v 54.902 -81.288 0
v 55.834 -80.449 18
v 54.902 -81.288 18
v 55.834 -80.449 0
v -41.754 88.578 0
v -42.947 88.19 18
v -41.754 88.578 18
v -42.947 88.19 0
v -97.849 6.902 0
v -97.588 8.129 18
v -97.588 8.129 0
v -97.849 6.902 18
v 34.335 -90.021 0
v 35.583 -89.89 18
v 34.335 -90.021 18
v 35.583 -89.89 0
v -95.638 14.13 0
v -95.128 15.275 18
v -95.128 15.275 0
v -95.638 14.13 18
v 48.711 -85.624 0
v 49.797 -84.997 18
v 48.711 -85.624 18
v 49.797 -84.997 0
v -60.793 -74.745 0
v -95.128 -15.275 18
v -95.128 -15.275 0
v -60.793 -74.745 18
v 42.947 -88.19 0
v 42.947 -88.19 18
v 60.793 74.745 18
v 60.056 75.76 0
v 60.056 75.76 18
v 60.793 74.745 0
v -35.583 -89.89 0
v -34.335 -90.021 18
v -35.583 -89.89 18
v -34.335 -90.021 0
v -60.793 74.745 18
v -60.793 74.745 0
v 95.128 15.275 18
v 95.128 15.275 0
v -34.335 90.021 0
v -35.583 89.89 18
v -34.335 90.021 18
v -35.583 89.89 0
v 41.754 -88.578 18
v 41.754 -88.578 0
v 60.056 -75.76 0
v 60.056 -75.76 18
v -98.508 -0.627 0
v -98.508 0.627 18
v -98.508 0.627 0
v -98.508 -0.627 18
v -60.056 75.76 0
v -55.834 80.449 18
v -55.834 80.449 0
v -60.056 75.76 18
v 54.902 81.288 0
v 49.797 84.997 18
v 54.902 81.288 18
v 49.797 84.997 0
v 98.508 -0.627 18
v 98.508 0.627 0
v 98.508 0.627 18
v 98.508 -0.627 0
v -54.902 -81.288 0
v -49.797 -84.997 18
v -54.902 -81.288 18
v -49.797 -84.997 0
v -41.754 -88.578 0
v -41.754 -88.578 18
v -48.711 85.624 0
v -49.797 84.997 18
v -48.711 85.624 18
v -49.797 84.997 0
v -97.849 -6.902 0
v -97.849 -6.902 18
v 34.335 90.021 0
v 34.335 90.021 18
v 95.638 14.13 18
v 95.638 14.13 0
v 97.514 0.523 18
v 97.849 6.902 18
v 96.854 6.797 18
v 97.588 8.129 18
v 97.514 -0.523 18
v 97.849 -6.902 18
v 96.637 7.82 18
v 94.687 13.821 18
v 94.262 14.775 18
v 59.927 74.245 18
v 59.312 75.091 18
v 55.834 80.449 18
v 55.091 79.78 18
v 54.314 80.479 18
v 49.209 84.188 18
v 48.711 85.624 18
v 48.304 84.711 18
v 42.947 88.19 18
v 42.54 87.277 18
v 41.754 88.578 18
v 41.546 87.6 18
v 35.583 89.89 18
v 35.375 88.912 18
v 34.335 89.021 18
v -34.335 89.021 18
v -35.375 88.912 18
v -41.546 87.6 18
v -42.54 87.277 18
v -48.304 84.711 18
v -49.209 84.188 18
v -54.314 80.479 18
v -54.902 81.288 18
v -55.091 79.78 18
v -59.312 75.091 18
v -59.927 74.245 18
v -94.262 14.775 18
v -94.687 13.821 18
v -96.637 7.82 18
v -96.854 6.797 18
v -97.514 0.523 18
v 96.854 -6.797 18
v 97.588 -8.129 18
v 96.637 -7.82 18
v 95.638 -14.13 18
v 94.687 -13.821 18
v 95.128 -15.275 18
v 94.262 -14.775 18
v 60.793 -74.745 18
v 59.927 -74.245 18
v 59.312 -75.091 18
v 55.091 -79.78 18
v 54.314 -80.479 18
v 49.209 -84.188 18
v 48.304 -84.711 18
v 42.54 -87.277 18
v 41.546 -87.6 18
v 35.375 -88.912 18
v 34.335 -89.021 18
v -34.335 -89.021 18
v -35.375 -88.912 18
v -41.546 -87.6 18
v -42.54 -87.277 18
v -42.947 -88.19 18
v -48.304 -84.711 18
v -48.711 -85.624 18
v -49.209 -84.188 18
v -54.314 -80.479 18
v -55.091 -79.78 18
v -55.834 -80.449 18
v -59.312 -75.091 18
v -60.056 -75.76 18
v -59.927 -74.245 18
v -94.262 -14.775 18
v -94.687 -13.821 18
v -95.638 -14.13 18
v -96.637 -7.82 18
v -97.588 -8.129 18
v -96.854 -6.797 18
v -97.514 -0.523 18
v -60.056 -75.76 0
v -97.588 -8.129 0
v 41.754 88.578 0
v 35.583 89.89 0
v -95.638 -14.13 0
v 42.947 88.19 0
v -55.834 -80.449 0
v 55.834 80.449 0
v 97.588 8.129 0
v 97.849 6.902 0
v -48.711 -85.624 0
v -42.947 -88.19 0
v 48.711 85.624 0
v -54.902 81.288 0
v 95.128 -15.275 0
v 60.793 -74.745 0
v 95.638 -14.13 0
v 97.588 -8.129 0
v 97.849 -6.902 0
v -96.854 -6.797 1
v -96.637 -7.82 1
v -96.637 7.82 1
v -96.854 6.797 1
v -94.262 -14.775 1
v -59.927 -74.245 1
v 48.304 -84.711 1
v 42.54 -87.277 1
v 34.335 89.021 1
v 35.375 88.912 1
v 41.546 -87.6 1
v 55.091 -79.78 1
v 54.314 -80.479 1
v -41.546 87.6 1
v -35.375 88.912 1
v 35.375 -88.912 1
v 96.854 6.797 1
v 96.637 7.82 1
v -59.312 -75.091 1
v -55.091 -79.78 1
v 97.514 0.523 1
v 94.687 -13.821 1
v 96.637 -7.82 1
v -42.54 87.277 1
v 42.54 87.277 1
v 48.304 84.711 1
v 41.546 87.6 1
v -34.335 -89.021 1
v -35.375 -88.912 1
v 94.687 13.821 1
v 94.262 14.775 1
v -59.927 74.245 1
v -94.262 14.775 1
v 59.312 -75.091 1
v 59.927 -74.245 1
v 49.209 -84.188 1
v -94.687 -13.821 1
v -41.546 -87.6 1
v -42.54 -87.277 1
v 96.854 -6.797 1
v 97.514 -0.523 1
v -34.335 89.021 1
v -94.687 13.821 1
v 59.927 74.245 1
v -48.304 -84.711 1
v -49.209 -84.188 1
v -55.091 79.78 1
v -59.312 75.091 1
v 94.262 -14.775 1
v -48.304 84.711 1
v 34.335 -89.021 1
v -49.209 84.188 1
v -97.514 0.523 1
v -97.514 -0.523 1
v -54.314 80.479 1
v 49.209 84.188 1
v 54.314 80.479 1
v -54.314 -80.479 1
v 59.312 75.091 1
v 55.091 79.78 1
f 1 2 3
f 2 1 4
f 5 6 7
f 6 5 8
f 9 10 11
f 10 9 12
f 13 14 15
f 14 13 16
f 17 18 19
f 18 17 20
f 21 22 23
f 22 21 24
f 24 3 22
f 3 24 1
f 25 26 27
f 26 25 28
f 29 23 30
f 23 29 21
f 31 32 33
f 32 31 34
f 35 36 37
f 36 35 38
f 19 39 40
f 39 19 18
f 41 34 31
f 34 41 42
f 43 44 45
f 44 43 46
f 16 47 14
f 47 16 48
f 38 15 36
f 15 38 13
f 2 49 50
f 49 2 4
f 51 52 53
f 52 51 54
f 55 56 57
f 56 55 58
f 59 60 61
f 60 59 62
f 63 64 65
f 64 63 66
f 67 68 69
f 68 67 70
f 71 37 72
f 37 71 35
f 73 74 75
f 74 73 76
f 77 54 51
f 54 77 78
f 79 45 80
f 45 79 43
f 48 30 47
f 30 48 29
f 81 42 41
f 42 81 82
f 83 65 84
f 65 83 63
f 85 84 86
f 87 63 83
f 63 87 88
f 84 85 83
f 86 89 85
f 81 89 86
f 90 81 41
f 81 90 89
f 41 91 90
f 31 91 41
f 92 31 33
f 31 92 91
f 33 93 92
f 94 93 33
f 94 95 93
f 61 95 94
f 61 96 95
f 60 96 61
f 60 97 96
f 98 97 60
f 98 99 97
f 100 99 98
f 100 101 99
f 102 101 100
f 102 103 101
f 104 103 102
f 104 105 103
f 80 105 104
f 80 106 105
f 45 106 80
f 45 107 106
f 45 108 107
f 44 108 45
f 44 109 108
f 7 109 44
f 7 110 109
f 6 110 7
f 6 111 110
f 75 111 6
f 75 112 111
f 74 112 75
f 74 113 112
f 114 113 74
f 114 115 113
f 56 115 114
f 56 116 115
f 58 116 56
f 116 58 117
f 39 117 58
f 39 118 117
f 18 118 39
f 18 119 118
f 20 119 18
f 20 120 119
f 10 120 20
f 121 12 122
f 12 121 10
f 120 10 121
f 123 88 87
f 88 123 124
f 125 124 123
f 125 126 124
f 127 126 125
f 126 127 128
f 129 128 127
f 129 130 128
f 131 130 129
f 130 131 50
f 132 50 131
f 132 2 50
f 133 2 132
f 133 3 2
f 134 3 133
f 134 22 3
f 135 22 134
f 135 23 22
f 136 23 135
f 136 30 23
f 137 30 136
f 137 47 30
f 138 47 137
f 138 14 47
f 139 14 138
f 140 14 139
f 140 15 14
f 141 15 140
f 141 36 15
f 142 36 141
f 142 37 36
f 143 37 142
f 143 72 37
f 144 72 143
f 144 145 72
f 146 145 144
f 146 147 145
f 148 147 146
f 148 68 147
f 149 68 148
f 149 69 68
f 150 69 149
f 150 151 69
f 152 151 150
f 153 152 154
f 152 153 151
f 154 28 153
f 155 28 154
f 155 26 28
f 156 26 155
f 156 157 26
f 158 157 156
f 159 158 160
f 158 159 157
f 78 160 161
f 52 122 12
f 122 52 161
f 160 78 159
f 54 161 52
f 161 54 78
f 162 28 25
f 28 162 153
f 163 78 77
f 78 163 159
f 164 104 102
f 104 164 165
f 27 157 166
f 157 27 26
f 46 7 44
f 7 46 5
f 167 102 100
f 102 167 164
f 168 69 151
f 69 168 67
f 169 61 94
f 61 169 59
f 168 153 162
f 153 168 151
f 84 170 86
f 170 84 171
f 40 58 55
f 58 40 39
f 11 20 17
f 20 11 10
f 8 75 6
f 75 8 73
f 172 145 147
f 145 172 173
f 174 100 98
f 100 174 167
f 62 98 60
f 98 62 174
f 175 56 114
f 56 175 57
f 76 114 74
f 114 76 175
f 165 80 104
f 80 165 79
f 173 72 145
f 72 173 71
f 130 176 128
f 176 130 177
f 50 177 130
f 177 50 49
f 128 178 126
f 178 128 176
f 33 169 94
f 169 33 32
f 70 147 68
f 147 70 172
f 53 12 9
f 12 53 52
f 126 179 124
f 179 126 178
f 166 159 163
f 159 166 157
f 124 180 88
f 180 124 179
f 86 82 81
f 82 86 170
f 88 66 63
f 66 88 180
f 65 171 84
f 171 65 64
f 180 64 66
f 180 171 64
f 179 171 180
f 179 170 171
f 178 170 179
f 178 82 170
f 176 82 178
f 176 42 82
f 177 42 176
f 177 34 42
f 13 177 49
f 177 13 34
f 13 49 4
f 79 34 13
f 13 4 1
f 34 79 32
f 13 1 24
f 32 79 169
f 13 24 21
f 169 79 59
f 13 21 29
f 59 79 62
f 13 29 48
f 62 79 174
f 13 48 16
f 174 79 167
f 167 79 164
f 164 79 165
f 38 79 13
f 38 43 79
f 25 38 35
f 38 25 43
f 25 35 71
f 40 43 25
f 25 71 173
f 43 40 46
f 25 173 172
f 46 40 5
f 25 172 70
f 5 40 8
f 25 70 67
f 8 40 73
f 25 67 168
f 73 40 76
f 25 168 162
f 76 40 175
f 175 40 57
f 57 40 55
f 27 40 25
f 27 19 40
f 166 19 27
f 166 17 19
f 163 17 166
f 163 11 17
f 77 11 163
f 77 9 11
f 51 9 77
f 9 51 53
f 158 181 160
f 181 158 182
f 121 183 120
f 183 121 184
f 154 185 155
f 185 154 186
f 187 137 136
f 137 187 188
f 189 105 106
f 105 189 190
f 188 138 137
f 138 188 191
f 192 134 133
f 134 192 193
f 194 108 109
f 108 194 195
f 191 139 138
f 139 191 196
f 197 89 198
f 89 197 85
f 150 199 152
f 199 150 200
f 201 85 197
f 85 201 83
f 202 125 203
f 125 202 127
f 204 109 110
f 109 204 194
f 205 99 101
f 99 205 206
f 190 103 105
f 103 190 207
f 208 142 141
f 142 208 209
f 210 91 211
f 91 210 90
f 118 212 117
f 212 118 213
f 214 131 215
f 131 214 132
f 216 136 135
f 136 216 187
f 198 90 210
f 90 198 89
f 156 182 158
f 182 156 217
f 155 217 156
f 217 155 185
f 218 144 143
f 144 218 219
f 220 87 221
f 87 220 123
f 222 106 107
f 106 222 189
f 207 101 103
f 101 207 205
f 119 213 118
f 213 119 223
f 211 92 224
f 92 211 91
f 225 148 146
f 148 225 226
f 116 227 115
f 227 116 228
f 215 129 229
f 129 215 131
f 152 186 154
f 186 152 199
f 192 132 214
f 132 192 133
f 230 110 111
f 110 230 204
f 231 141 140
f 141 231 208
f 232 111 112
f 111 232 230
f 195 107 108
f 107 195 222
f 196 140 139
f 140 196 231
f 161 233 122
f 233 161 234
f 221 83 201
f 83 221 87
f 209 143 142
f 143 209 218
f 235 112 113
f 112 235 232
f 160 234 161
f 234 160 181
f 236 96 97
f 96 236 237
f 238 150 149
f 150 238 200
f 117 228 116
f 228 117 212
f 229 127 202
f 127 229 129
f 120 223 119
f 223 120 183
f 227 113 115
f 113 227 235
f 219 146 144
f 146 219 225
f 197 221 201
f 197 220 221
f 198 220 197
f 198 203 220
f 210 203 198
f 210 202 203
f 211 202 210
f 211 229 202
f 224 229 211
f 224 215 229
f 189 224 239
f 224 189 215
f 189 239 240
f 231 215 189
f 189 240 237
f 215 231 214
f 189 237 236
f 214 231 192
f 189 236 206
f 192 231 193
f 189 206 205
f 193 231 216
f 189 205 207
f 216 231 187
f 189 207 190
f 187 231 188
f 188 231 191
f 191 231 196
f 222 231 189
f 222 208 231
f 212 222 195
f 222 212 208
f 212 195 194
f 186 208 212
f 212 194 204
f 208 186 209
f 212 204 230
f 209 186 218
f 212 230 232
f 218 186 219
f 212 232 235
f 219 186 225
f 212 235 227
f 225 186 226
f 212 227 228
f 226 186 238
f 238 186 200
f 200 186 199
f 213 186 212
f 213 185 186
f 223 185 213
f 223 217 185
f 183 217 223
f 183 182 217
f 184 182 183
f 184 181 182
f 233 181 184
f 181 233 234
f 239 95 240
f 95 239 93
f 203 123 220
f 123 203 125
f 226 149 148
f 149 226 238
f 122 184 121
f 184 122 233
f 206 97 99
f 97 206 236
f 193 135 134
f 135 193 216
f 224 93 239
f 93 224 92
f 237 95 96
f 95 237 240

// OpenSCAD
// A twelve-sided letter die: a regular dodecahedron, sphere-clipped so each pentagon face becomes a flat circle
// (the sphere's own radius is picked so that circle reaches exactly to the pentagon's edge midpoints -- see the
// sphere/dodecahedron discussion this came out of), with one letter engraved into each face.
//
// letterSets holds 7 dice's worth of letters for a Spelling-Bee-style word game (words need only contain
// whichever die is playing the centre role -- unlike Boggle, adjacency on the die doesn't matter) -- picked for a
// reasonable vowel/consonant mix on every die, Scrabble-ish in frequency, "Qu" standing in for Q the way Boggle's
// own cubes do. Change `set` below to carve a different one.
letterSets = [
	["A", "E", "I", "K", "O", "C", "D", "H", "N", "P", "S", "T"],
	["A", "E", "I", "H", "M", "N", "R", "S", "T", "D", "V", "Y"],
	["E", "F", "H", "M", "N", "O", "R", "S", "U", "D", "Y", "B"],
	["A", "B", "E", "F", "I", "J", "L", "M", "O", "R", "S", "U"],
	["A", "B", "E", "G", "I", "L", "O", "R", "S", "T", "U", "Z"],
	["A", "C", "E", "G", "L", "N", "O", "Qu", "R", "T", "U", "W"],
	["A", "C", "D", "E", "G", "I", "L", "N", "O", "P", "T", "W"],
];
set = -2;

edge = 20;						// edge length
inradius = edge / 2 * sqrt(5 / 2 + 11 / (2 * sqrt(5)));	// centre to a face
apothem  = edge / (2 * tan(180 / 5));						// centre to that face's own edge midpoint
tilt = atan(2);					// 63.435 degrees between adjacent face normals
die_r = sqrt(inradius * inradius + apothem * apothem);	// the die's own radius -- reaches to each face's edge midpoints

module slab(x, y, z)
	cube([x, y, z], center = true);

module dodecahedron() {
	x = 4 * edge;
	z = 2 * inradius;
	// a plain `for` here would union its five iterations before intersecting -- barely constraining anything, since
	// intersecting with the *union* of the five tilted slabs excludes almost nothing a single one didn't already.
	// intersection_for() is the dedicated construct for intersecting each iteration in turn (see childrenOf's own
	// comment in evaluate.ts for why plain `for` cannot do this).
	intersection() {
		slab(x, x, z);
		intersection_for (i = [0 : 4])
			rotate([tilt, 0, i * 72])   slab(x, x, z);
	}
}

// the die itself: a sphere clipped by the dodecahedron, so every face is exactly the pentagon's own inscribed circle
module die()
	intersection() {
		sphere(r = die_r);
		dodecahedron();
	}

// one letter, cut down through its face's own plane -- starting inside the die and ending outside it, so the
// difference is a clean engraving regardless of the sphere's curvature there
module letter(ch)
	translate([0, 0, inradius - 1])
		linear_extrude(height = 3)
			text(ch, size = apothem, halign = "center", valign = "center", font = "Liberation Sans:style=Bold");

// one labelled die: the twelve faces, in the same order dodecahedron() builds them -- the "north" and "south"
// poles (the one untilted slab, and its opposite), then five around each pole, tilted and spun 72 degrees apart
module labelled_die(letters) {
	difference() {
		die();
		union() {
			letter(letters[0]);
			for (i = [0 : 4])
				rotate([tilt, 0, i * 72])   letter(letters[i + 1]);
			rotate([180, 0, 0]) {
				letter(letters[6]);
				for (i = [0 : 4])
					rotate([tilt, 0, i * 72])   letter(letters[i + 7]);
			}
		}
	}
}

// --- tray + lid: seven cylindrical cells (one per die, plain flat floors, walls between and around them, the
// same shape the real Boggle tray in the reference photo uses) laid out with a centre cell and six around it, to
// match the Spelling-Bee-style "must use the centre letter" rule -- with a lid that seals over the top and gives
// a die room to tumble while the whole thing is shaken, since the cell walls alone are shorter than a die and are
// only there to keep settled dice apart, not to contain a shake by themselves.
tray_clearance = 4;			// radial room around a die in its own cell
tray_wall      = 2;			// material between neighbouring cells, and around the outside
cell_r         = die_r + tray_clearance;
tray_spacing   = 2 * cell_r + tray_wall;
tray_floor     = 3;
tray_wall_h    = 15;			// the tray's own walls: shorter than a die, just enough to separate settled dice
tray_h         = tray_floor + tray_wall_h;

// one centre die, six in a ring around it
tray_centres = [[0, 0], for (a = [0 : 60 : 300]) [tray_spacing * cos(a), tray_spacing * sin(a)]];

module tray_holes(r)
	for (c = tray_centres)
		translate(c) circle(r = r);

module tray_area(r, off)
	offset(r = off) hull() tray_holes(r);

module tray() {
/*	color([1,1,1], $metallic=1) union() {
	difference() {
		linear_extrude(tray_h) tray_area(cell_r, tray_wall * 2);
		translate([0, 0, tray_floor])
			linear_extrude(tray_wall_h + 1)
				tray_holes(cell_r);
	}

	difference() {
		linear_extrude(tray_h) tray_area(cell_r, tray_wall * 2 + 3);
		translate([0,0,4]) linear_extrude(tray_h) tray_area(cell_r, tray_wall * 2 + 1.5);
	}
	}
*/	difference() {
		linear_extrude(tray_h) tray_area(cell_r, tray_wall * 3);
		translate([0,0,1]) linear_extrude(tray_h) tray_area(cell_r, tray_wall * 3 - 1);
	}
}

module lid() {
	color([0,1,0]) tray();
	fit     = 0.4;								// total clearance so the lid slips over the tray's wall rather than jamming
	cavity  = 2 * die_r + 30;	// together with the tray's own wall height, enough for a die to tumble

	//minkowski() {
	//	linear_extrude(1) tray_area(cell_r, tray_wall + fit + 1 - 20);
	//	sphere(r = 20);
	//}

//	color(function(x, y, z) [x, y, z] / 100)
	color([0.5,0.5,0.5,0])
	translate([0,0,14])
	rotate([0,0,0]) {
	difference() {
		minkowski() {linear_extrude(cavity) tray_area(cell_r, tray_wall + 2 - 20); sphere(r = 20);}
		translate([0, 0, -50]) cube([200,200,100], center=true);
		translate([0, 0, -2])
			minkowski() {linear_extrude(cavity) tray_area(cell_r, tray_wall - 20 - 1.5); sphere(r = 20);}
		translate([0, 0, 10-cavity])
			linear_extrude(cavity) tray_area(cell_r, tray_wall +.5);
		translate([0, 0, cavity + 20 - 1])
			linear_extrude(1)
				text("Beegle", size = 40, halign = "center", valign = "center", font = "Liberation Sans:style=Bold");
	}
	}

}

if (set >= 0) {
	labelled_die(letterSets[set]);

} else if (set == -1) {
	spacing = 2 * die_r * 1.15;	// a die's own diameter, plus a gap
	for (i = [0 : len(letterSets) - 1])
		translate([(i - (len(letterSets) - 1) / 2) * spacing, 0, 0])
			labelled_die(letterSets[i]);

} else if (set == -2) {			// the tray, with a die (unlabelled) resting in each cell
	tray();
	//for (c = tray_centres)
	//	translate([c[0], c[1], tray_floor + die_r])
	//		die();

} else if (set == -3) {			// the lid on its own
	lid();

} else if (set == -4) {			// tray and lid stacked, as they sit when closed
	tray();
	translate([0, 0, tray_h])
		lid();
}
